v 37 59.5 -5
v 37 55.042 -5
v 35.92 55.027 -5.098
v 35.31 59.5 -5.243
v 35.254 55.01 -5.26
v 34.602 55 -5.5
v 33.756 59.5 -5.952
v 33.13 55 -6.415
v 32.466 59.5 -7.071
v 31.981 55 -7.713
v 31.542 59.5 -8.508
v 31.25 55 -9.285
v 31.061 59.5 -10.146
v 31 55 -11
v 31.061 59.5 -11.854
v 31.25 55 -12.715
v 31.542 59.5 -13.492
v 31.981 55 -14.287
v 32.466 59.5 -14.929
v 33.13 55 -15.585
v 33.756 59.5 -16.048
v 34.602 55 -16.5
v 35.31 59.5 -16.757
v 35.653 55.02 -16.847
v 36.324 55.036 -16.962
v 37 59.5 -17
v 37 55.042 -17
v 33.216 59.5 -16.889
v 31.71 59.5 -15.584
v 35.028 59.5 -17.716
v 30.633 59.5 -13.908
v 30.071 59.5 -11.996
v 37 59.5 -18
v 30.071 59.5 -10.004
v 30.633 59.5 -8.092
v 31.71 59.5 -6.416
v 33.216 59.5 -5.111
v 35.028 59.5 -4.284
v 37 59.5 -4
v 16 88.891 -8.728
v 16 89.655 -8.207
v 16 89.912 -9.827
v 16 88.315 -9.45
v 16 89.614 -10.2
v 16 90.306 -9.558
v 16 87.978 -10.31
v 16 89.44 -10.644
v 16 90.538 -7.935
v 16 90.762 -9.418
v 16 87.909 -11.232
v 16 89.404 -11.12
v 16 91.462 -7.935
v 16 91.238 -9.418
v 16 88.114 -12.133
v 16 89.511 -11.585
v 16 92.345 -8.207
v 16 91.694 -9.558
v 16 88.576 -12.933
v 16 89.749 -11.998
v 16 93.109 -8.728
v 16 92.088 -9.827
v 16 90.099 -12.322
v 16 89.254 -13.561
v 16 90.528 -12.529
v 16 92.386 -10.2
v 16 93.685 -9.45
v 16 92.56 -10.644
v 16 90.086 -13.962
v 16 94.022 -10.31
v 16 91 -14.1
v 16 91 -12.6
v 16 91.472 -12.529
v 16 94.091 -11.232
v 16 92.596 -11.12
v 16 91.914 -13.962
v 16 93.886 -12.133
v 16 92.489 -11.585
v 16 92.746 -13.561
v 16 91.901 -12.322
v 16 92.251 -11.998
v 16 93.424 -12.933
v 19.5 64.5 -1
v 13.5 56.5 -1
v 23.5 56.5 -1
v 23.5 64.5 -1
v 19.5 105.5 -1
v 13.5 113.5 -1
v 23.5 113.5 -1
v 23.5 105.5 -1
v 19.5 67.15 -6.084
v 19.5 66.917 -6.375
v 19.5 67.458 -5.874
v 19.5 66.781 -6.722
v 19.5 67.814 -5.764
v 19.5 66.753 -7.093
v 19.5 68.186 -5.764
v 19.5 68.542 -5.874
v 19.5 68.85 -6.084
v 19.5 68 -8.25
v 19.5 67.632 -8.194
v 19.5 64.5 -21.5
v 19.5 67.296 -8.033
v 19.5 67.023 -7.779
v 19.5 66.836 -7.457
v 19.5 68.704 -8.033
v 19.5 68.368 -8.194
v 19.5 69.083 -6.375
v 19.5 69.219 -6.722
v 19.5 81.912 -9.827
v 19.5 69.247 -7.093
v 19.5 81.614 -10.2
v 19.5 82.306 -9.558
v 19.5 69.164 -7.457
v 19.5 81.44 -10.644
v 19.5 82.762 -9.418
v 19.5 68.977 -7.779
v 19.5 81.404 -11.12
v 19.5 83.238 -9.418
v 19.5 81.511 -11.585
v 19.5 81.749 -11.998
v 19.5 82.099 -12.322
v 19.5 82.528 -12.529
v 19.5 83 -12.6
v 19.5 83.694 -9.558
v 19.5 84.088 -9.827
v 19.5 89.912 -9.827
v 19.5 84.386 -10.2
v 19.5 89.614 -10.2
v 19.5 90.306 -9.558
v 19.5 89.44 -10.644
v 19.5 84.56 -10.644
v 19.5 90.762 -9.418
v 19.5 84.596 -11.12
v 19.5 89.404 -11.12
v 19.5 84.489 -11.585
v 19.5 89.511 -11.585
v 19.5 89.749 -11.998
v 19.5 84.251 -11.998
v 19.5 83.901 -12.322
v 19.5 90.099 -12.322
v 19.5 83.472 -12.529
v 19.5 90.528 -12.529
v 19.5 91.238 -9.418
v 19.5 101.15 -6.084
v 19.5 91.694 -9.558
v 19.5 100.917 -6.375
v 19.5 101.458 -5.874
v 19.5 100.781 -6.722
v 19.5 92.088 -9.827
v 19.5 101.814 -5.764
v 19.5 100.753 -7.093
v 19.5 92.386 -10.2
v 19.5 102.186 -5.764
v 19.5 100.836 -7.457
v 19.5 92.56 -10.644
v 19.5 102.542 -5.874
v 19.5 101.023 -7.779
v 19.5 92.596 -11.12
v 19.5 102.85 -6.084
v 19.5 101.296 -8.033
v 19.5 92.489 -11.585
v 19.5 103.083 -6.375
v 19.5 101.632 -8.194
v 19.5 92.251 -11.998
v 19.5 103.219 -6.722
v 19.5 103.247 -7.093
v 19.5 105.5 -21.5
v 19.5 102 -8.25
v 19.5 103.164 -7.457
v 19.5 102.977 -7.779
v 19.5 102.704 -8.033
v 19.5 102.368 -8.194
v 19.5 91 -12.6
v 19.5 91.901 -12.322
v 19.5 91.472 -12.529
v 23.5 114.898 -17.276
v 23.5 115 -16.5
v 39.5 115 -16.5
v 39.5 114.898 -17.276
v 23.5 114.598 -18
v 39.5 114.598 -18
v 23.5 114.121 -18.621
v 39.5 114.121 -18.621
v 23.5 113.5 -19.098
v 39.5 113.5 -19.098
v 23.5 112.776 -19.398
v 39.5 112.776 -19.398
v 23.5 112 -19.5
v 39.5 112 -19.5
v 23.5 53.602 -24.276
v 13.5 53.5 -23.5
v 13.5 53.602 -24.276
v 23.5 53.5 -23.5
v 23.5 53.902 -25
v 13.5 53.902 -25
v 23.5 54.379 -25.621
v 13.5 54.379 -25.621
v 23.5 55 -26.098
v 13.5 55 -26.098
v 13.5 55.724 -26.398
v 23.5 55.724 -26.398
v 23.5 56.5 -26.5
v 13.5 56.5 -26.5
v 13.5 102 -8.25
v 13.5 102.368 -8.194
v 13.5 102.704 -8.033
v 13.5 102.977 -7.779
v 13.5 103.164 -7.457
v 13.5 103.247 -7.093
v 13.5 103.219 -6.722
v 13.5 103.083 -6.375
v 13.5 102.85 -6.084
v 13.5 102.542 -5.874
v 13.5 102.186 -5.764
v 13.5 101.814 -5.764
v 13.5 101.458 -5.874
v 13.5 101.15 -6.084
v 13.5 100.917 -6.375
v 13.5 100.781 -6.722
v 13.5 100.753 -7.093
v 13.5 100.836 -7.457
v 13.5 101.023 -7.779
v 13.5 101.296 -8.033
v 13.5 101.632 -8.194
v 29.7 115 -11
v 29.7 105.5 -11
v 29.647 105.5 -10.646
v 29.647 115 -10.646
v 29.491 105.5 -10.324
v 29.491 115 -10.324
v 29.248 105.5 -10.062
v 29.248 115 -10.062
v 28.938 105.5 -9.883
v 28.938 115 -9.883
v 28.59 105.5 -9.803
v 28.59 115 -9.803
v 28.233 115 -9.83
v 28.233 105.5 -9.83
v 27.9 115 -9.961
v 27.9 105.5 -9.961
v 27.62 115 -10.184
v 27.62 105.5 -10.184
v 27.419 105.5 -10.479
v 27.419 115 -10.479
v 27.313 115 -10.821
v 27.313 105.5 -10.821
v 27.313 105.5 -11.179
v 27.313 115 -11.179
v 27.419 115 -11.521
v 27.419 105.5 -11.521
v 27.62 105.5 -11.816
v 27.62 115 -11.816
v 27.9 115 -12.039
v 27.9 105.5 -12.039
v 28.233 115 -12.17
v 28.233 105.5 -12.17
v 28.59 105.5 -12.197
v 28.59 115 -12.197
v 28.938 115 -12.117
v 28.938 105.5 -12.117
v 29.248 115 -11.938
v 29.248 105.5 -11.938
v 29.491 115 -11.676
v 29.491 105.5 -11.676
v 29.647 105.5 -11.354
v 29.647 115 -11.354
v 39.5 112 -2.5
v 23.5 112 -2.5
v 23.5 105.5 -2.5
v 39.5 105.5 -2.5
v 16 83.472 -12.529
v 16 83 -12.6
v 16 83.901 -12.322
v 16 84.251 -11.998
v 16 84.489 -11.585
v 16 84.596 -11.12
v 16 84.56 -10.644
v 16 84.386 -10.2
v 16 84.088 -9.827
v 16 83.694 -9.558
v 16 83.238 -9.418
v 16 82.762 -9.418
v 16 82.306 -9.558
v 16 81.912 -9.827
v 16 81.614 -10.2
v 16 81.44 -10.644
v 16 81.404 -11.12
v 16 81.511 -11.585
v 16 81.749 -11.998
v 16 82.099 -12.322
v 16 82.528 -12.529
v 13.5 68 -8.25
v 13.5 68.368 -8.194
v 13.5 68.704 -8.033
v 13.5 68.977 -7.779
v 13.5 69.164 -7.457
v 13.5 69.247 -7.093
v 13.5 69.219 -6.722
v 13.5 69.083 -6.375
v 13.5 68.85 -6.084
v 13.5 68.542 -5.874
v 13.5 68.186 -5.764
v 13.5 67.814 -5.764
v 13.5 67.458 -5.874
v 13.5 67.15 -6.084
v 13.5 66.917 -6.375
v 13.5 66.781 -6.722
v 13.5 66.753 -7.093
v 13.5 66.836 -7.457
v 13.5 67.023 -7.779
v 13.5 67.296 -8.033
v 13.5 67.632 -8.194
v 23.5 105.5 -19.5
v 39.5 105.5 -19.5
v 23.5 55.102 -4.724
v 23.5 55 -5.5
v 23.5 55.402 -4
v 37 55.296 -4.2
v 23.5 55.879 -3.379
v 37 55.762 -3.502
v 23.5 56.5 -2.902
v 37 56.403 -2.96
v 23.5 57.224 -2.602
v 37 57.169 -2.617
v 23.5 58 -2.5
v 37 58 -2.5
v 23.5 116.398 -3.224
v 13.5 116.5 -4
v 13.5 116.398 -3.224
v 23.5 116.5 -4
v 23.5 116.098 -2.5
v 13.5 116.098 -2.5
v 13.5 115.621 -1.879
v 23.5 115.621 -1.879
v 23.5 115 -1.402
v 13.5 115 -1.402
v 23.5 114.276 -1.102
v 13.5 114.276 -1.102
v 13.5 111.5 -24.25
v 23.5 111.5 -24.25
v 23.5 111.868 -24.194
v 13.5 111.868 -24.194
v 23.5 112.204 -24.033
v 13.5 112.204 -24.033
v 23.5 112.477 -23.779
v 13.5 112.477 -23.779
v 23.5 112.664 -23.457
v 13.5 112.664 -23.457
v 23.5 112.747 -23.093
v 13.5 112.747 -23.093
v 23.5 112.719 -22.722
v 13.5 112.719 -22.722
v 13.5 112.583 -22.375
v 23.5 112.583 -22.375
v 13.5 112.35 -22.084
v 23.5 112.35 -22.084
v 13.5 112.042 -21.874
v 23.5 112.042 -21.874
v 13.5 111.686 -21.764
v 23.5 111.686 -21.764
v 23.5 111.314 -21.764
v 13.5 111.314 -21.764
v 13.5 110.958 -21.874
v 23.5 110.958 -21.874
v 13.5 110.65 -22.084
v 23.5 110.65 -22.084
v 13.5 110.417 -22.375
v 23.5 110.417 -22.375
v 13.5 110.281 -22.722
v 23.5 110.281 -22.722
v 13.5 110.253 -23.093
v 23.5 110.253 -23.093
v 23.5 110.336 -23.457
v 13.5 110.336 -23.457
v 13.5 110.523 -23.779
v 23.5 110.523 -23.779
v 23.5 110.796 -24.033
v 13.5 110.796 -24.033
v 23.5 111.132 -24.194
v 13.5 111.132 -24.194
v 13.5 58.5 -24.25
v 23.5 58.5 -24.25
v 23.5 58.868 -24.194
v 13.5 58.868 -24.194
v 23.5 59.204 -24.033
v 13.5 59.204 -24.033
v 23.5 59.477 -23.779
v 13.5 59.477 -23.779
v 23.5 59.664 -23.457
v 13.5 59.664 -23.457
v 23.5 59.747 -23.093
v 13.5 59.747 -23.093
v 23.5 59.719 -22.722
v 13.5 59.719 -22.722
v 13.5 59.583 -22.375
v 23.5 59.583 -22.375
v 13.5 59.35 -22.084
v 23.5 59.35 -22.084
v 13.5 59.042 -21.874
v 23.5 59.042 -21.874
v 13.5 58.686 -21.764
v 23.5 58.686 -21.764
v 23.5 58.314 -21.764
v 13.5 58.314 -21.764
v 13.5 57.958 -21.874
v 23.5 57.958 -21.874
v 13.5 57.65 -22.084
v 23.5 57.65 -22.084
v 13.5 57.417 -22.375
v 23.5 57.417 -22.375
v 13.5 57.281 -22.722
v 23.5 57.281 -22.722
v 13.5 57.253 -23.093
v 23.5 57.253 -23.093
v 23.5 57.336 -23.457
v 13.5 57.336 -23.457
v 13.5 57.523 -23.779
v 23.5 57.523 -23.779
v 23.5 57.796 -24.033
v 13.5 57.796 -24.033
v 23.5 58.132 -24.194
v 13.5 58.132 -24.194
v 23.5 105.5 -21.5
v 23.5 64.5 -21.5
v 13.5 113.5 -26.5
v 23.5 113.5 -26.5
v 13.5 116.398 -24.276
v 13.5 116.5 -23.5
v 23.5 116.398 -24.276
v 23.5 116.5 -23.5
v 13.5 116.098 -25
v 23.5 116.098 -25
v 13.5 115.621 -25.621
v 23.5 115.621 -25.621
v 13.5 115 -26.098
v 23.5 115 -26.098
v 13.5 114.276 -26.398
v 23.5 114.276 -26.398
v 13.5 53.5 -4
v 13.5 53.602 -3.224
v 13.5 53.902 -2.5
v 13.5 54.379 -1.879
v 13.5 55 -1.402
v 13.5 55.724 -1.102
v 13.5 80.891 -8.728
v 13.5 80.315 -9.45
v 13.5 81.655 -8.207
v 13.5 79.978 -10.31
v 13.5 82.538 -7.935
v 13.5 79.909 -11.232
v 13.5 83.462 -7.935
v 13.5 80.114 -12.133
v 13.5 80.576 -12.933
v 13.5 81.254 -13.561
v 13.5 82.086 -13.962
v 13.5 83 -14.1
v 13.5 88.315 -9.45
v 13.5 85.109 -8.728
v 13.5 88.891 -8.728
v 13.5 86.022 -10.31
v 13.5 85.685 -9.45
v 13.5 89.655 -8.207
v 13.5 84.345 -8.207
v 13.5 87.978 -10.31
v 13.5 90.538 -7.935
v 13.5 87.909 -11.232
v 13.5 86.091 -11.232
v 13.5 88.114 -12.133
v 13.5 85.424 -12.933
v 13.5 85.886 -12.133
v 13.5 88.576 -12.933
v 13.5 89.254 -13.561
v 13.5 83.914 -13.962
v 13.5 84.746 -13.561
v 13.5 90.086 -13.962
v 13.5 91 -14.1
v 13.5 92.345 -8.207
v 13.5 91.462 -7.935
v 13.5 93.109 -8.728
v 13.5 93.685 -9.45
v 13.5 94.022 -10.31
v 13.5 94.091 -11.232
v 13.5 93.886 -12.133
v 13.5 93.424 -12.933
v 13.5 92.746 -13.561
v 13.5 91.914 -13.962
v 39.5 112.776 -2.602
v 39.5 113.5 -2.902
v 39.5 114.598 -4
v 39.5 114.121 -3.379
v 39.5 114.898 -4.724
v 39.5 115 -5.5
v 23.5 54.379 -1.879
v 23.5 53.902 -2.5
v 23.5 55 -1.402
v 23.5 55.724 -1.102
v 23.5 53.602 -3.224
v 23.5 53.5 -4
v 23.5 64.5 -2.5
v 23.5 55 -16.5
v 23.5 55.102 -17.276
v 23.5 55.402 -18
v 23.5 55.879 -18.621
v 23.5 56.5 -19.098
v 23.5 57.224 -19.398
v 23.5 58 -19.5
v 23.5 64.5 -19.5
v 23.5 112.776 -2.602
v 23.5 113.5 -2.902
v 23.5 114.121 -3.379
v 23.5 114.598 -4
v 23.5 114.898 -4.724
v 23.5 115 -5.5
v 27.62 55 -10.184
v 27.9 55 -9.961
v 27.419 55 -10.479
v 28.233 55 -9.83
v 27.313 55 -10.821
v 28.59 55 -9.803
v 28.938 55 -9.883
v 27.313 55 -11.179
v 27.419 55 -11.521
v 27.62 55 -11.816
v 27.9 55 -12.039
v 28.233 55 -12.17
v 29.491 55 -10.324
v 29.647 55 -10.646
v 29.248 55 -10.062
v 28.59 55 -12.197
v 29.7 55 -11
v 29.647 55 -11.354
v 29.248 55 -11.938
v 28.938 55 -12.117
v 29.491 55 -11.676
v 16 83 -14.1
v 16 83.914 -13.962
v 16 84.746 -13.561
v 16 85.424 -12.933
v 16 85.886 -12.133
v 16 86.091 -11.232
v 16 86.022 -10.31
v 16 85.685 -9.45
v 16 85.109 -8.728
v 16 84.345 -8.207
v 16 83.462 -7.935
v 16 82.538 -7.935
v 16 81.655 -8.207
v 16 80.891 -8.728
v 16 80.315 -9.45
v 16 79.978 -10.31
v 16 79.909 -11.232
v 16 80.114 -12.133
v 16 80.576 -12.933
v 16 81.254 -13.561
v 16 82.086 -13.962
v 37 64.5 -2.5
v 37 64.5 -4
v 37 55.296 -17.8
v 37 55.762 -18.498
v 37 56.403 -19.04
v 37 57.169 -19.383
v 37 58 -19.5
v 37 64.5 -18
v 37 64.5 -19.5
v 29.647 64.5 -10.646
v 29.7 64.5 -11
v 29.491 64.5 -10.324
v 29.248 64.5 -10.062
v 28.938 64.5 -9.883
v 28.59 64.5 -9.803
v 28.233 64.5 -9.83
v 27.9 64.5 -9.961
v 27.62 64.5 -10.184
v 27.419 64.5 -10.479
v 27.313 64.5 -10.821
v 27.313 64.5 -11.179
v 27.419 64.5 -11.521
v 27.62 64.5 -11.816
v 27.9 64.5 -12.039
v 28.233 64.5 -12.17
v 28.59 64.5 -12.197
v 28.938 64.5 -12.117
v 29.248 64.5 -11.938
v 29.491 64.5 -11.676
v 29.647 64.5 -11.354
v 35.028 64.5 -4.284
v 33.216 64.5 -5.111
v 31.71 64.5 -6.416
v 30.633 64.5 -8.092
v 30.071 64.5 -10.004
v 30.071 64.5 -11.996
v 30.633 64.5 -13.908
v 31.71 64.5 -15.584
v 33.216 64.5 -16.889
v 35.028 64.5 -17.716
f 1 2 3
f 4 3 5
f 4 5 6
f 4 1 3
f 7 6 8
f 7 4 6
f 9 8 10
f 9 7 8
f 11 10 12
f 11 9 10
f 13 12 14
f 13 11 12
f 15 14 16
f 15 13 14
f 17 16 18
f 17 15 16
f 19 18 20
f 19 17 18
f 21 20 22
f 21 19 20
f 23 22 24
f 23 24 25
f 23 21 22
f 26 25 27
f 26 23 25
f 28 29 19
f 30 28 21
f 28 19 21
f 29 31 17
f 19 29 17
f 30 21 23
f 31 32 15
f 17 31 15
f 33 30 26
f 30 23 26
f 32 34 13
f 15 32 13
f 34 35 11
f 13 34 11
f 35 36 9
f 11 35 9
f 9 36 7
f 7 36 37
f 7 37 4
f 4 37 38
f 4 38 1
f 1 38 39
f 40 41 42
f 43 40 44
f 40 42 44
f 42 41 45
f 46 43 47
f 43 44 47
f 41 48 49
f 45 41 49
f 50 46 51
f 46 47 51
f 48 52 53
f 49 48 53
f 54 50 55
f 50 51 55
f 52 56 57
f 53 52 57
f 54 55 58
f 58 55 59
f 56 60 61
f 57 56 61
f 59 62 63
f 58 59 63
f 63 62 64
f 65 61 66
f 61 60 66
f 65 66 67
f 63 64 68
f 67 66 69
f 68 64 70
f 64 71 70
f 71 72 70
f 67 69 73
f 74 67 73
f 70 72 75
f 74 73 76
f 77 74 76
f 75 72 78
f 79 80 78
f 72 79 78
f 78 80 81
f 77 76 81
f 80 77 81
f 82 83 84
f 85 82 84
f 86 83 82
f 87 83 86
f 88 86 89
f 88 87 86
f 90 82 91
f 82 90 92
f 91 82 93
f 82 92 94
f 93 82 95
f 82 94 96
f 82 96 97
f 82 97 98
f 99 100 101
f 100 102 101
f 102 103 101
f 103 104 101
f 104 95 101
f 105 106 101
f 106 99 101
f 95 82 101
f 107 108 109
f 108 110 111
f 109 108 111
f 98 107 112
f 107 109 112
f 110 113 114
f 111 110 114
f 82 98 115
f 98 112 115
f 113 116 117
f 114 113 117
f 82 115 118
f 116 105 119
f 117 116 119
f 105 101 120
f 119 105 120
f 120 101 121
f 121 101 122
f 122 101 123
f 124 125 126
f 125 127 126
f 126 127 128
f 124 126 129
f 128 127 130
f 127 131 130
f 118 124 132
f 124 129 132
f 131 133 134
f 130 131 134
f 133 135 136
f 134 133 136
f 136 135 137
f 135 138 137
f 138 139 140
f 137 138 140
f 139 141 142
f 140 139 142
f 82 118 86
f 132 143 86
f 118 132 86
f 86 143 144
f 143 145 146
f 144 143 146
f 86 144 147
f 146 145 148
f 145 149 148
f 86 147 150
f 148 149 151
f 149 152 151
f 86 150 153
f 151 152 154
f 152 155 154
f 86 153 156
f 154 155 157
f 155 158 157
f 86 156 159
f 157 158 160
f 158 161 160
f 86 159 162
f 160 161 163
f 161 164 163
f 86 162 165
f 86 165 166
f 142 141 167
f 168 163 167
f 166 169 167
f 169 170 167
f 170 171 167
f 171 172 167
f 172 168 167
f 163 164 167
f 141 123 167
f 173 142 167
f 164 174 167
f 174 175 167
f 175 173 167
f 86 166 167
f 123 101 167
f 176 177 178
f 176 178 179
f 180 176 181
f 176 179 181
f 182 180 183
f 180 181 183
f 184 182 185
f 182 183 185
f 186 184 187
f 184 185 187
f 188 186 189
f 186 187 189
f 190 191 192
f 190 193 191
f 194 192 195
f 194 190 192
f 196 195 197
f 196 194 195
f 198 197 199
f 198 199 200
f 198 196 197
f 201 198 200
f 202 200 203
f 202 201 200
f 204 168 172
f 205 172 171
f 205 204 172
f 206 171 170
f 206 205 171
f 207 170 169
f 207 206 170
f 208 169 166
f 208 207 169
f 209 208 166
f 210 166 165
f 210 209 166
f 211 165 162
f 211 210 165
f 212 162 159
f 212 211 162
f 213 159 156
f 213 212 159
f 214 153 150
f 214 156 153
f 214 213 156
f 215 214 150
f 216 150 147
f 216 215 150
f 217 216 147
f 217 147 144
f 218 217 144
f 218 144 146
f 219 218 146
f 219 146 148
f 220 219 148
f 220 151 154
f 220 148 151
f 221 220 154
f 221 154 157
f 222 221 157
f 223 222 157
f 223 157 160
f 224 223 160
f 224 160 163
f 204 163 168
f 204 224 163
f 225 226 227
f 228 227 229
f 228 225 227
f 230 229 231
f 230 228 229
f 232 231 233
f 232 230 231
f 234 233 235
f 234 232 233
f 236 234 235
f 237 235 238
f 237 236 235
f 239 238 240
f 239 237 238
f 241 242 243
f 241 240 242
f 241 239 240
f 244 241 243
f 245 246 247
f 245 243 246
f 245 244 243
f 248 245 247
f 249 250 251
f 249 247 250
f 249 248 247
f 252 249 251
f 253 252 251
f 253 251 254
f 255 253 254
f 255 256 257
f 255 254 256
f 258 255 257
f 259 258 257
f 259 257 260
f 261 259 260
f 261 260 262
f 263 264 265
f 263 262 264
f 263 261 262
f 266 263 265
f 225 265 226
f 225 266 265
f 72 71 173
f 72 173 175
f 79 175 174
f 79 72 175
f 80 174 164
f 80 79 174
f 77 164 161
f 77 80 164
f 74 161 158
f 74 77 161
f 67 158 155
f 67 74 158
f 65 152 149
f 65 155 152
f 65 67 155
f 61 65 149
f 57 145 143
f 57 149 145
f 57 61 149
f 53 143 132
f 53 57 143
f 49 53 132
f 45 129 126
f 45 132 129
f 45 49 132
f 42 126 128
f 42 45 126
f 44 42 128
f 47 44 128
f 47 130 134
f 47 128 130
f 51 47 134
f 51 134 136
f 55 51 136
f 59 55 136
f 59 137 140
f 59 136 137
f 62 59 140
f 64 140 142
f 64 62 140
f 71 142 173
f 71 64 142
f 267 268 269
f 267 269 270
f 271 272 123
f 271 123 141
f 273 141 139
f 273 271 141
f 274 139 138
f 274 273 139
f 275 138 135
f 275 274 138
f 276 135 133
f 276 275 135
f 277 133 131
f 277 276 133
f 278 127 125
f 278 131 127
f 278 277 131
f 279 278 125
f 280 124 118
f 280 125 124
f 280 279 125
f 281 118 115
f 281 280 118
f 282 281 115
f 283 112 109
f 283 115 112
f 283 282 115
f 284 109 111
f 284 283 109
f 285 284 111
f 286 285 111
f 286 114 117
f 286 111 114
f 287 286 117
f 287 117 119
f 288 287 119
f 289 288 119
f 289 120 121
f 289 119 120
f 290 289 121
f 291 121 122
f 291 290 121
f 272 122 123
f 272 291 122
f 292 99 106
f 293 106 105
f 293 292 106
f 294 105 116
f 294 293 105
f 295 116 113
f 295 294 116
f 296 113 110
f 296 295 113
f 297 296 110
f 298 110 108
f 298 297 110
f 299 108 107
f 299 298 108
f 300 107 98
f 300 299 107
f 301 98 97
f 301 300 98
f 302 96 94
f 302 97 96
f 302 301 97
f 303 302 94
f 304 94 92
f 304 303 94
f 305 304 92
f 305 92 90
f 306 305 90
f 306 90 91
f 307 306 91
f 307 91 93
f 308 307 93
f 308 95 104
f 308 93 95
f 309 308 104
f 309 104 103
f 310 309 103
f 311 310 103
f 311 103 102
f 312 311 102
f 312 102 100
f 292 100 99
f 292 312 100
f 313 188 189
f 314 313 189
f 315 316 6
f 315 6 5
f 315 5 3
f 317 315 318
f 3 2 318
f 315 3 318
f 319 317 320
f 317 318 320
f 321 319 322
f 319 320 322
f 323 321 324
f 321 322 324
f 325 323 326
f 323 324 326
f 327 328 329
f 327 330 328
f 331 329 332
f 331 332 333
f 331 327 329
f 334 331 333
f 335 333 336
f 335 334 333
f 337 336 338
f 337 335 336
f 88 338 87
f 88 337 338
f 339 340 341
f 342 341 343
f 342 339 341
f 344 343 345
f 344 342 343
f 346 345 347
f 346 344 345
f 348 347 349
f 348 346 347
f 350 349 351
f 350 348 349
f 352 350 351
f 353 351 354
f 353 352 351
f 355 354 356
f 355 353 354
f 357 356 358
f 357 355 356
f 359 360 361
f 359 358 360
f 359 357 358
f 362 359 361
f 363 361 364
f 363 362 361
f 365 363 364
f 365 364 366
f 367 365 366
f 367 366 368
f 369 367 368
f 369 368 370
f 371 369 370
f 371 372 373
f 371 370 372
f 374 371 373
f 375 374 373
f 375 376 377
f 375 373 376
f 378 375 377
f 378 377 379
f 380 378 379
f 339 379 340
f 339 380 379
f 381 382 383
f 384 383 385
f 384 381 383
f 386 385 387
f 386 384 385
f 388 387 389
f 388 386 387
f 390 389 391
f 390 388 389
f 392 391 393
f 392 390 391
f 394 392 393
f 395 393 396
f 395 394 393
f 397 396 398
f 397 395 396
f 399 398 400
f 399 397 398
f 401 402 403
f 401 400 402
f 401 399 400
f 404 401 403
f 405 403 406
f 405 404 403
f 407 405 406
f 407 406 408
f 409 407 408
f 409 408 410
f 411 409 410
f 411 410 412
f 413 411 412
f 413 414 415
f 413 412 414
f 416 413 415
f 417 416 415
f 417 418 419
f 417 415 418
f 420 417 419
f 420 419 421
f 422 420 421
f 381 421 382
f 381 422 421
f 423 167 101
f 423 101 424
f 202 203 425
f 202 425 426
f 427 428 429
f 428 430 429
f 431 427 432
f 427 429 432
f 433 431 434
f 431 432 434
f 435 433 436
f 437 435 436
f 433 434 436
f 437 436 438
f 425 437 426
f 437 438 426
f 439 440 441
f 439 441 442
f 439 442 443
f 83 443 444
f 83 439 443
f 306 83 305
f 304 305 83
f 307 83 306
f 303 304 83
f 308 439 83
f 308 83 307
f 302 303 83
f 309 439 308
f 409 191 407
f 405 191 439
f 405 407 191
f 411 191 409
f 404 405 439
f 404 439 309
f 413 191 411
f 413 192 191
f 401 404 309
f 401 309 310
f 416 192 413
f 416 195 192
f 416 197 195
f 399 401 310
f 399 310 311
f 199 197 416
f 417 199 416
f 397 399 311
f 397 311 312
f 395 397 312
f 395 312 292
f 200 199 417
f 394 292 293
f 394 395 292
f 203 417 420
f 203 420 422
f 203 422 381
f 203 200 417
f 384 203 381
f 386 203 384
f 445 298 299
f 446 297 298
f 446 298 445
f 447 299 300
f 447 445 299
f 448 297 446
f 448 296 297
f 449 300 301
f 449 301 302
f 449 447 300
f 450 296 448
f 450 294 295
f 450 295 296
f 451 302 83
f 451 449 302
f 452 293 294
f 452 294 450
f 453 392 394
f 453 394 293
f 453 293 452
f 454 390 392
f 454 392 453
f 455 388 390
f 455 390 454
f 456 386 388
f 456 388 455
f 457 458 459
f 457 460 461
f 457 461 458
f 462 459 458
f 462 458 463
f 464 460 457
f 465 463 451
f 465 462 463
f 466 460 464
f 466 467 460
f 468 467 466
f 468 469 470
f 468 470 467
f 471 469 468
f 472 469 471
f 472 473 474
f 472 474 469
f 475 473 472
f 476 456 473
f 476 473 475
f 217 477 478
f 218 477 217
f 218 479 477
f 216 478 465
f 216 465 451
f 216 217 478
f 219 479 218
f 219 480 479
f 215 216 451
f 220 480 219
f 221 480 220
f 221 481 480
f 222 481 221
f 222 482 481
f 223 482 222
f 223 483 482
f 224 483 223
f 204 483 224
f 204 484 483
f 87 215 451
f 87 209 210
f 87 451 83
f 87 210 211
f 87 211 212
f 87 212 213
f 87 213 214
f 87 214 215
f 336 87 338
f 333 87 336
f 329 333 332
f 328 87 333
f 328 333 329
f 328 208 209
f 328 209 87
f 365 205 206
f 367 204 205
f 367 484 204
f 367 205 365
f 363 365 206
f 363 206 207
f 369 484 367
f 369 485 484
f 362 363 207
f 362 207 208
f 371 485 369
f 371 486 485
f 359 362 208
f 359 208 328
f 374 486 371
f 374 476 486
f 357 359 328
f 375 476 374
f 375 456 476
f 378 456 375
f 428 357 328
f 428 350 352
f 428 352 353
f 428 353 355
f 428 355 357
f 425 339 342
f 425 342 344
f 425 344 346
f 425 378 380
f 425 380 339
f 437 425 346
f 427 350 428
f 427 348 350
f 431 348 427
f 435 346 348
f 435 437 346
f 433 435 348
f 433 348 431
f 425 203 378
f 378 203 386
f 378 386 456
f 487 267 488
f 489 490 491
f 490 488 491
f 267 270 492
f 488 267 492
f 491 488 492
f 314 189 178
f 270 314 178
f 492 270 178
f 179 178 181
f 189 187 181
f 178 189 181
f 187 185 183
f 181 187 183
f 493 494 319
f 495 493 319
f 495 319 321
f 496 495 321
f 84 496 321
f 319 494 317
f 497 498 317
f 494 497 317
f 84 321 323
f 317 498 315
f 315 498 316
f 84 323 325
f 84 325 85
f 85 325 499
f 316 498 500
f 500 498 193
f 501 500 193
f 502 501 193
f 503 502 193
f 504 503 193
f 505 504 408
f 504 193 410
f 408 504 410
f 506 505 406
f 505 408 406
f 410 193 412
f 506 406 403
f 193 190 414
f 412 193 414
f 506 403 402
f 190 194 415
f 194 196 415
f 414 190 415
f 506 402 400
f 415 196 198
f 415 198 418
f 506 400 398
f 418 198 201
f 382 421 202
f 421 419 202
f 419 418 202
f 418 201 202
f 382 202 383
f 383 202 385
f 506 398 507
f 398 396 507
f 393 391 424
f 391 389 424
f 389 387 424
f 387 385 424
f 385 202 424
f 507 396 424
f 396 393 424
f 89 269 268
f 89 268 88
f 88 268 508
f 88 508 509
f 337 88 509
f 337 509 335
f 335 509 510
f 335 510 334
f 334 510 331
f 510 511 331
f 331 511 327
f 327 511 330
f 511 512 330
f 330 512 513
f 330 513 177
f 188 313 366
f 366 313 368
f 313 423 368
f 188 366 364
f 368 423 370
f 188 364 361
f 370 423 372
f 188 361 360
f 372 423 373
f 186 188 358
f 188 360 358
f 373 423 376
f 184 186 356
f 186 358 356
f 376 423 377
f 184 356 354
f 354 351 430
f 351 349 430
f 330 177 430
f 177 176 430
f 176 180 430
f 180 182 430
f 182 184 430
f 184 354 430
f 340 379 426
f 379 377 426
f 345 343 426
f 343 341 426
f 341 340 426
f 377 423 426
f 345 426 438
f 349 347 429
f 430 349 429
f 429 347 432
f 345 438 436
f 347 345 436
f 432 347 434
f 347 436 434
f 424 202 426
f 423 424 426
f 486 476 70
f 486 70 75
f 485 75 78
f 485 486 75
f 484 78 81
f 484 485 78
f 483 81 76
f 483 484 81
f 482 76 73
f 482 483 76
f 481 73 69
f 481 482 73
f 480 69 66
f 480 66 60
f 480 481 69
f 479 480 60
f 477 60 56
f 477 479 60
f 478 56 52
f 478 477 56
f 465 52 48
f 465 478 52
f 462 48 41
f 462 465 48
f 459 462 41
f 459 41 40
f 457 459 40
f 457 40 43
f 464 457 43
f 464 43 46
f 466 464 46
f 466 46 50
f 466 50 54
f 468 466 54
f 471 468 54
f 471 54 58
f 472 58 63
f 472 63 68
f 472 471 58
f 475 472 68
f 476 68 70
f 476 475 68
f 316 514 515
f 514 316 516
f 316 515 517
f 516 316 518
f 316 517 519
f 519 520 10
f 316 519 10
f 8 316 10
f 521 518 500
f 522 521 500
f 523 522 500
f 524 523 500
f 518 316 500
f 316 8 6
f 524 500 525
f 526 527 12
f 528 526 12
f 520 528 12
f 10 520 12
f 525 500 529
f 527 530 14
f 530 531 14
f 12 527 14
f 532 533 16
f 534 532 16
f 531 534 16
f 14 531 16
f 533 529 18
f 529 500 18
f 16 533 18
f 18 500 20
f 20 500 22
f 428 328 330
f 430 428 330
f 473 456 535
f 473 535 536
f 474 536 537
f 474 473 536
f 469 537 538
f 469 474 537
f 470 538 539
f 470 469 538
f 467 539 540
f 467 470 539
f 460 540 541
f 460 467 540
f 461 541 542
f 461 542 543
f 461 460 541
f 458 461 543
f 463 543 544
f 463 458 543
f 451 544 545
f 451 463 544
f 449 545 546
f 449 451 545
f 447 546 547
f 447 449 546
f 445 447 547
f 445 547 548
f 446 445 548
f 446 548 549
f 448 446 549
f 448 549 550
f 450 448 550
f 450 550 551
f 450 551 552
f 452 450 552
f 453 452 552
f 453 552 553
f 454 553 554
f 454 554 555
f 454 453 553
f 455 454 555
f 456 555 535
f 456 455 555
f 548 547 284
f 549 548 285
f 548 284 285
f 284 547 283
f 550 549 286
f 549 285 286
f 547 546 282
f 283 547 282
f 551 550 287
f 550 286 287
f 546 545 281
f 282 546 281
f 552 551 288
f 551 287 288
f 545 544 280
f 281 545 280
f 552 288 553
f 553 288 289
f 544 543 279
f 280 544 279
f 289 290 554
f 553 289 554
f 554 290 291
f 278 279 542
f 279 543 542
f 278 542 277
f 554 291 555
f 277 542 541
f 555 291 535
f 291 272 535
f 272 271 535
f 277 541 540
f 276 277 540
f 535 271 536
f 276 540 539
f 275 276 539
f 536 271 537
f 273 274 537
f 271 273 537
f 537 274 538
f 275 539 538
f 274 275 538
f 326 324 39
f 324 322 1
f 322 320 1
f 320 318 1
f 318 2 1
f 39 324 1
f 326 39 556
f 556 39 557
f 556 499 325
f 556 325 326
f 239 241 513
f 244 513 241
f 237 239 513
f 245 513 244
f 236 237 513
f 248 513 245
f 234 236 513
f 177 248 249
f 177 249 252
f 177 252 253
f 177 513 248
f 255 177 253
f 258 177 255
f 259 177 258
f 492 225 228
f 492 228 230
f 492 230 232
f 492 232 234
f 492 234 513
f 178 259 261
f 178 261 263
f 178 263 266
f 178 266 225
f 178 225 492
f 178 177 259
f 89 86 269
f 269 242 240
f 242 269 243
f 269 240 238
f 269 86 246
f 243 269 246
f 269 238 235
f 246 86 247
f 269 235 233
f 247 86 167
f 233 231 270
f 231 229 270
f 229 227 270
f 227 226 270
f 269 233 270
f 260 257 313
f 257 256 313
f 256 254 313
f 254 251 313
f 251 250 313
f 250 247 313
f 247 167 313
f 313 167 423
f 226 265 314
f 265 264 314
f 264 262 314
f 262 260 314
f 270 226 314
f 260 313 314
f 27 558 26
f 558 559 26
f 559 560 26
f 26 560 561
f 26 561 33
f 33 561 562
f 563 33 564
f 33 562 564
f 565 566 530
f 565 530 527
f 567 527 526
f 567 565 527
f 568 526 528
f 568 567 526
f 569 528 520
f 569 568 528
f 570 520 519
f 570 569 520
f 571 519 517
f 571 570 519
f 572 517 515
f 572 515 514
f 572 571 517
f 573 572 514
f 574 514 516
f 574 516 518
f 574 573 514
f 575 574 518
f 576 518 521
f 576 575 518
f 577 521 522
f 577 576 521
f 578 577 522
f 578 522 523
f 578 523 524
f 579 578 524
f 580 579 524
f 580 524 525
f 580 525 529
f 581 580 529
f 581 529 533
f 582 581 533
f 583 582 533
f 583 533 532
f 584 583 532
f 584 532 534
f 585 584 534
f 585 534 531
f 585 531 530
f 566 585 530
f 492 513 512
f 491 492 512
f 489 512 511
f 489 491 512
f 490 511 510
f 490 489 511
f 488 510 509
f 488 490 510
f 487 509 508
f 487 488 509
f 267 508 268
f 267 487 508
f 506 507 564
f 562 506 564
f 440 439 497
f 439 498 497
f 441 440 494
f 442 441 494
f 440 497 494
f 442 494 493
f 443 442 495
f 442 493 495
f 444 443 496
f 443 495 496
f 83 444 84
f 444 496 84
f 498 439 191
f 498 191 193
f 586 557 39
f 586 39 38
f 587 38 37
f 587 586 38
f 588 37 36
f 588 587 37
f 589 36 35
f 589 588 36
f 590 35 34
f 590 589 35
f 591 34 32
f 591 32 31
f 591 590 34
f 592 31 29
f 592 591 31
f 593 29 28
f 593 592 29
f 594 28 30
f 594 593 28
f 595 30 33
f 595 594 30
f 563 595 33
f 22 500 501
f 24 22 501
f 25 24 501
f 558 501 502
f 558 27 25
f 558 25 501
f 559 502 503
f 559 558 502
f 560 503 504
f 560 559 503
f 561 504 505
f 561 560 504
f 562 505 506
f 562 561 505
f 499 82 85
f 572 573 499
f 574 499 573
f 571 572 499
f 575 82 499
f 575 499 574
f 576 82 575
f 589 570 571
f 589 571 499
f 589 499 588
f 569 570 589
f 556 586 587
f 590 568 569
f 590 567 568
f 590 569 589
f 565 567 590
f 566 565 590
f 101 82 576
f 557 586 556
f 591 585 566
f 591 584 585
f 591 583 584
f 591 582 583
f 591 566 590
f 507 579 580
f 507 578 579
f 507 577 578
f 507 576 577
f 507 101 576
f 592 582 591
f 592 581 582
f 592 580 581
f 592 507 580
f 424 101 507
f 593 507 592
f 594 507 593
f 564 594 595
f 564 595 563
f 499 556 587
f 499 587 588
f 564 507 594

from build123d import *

# Parameters (mm, degrees)
CYLINDER893_R           = 1.6
CYLINDER893_DEPTH       = 10
CYLINDER893_PITCH_ANGLE = 90
CYLINDER894_R           = 1.6
CYLINDER894_DEPTH       = 10
CYLINDER894_PITCH_ANGLE = 90
CYLINDER896_R           = 3.1
CYLINDER896_DEPTH       = 2.5
CYLINDER896_PITCH_ANGLE = 90
CYLINDER895_R           = 3.1
CYLINDER895_DEPTH       = 2.5
CYLINDER895_PITCH_ANGLE = 90
BOX550_W                = 41
BOX550_H                = 41
BOX550_DEPTH            = 21
CYLINDER891_R           = 6
CYLINDER891_DEPTH       = 11
CYLINDER891_ROLL_ANGLE  = 90
CYLINDER945_R           = 7
CYLINDER945_DEPTH       = 5
CYLINDER945_ROLL_ANGLE  = 90
BOX559_W                = 10
BOX559_H                = 10
BOX559_DEPTH            = 17
CYLINDER693_R           = 1.2
CYLINDER693_DEPTH       = 10
CYLINDER693_ROLL_ANGLE  = 90
CYLINDER692_R           = 1.2
CYLINDER692_DEPTH       = 10
CYLINDER692_ROLL_ANGLE  = 90
CYLINDER697_R           = 1.25
CYLINDER697_DEPTH       = 15
CYLINDER697_PITCH_ANGLE = 90
CYLINDER695_R           = 1.25
CYLINDER695_DEPTH       = 11
CYLINDER695_PITCH_ANGLE = 90
CYLINDER696_R           = 1.25
CYLINDER696_DEPTH       = 15
CYLINDER696_PITCH_ANGLE = 90
CYLINDER694_R           = 1.25
CYLINDER694_DEPTH       = 11
CYLINDER694_PITCH_ANGLE = 90
BOX472_W                = 16
BOX472_H                = 60
BOX472_DEPTH            = 17
FILLET333_R             = 3
BOX473_W                = 10
BOX473_H                = 63
BOX473_DEPTH            = 25.5
FILLET332_R             = 3


with BuildPart() as cylinder1049:
    # Cylinder893 → Cylinder893 (new body)
    with BuildSketch(Plane.XY):
        Circle(CYLINDER893_R)
    extrude(amount=CYLINDER893_DEPTH)


with BuildPart() as cylinder1049_1:
    # Cylinder893 pitch: moved
    add(cylinder1049.part.rotate(Axis((0, 0, 0), (0, 1, 0)), CYLINDER893_PITCH_ANGLE))


with BuildPart() as cylinder1049_2:
    # Cylinder893 placement: moved
    add(cylinder1049_1.part.moved(Location((13.5, 83, -11))))


with BuildPart() as cylinder1050:
    # Cylinder894 → Cylinder894 (new body)
    with BuildSketch(Plane.XY):
        Circle(CYLINDER894_R)
    extrude(amount=CYLINDER894_DEPTH)


with BuildPart() as cylinder1050_1:
    # Cylinder894 pitch: moved
    add(cylinder1050.part.rotate(Axis((0, 0, 0), (0, 1, 0)), CYLINDER894_PITCH_ANGLE))


with BuildPart() as cylinder1050_2:
    # Cylinder894 placement: moved
    add(cylinder1050_1.part.moved(Location((13.5, 91, -11))))


with BuildPart() as cylinder1052:
    # Cylinder896 → Cylinder896 (new body)
    with BuildSketch(Plane.XY):
        Circle(CYLINDER896_R)
    extrude(amount=CYLINDER896_DEPTH)


with BuildPart() as cylinder1052_1:
    # Cylinder896 pitch: moved
    add(cylinder1052.part.rotate(Axis((0, 0, 0), (0, 1, 0)), CYLINDER896_PITCH_ANGLE))


with BuildPart() as cylinder1052_2:
    # Cylinder896 placement: moved
    add(cylinder1052_1.part.moved(Location((13.5, 83, -11))))


with BuildPart() as fusion593:
    # Cylinder895 → Cylinder895 (new body)
    with BuildSketch(Plane.XY):
        Circle(CYLINDER895_R)
    extrude(amount=CYLINDER895_DEPTH)


with BuildPart() as fusion593_1:
    # Cylinder895 pitch: moved
    add(fusion593.part.rotate(Axis((0, 0, 0), (0, 1, 0)), CYLINDER895_PITCH_ANGLE))


with BuildPart() as fusion593_2:
    # Cylinder895 placement: moved
    add(fusion593_1.part.moved(Location((13.5, 91, -11))))

    # Fusion593: union Cylinder1049, Cylinder1050, Cylinder1052
    add(cylinder1049_2.part)
    add(cylinder1050_2.part)
    add(cylinder1052_2.part)


with BuildPart() as cube741:
    # Box550 → Box550 (new body)
    with BuildSketch(Plane(origin=(19.5, 64.5, -21.5), x_dir=(1, 0, 0), z_dir=(0, 0, 1))):
        with Locations((20.5, 20.5)):
            Rectangle(BOX550_W, BOX550_H)
    extrude(amount=BOX550_DEPTH)


with BuildPart() as cylinder1048:
    # Cylinder891 → Cylinder891 (new body)
    with BuildSketch(Plane.XY):
        Circle(CYLINDER891_R)
    extrude(amount=CYLINDER891_DEPTH)


with BuildPart() as cylinder1048_1:
    # Cylinder891 roll: moved
    add(cylinder1048.part.rotate(Axis((0, 0, 0), (1, 0, 0)), CYLINDER891_ROLL_ANGLE))


with BuildPart() as cylinder1048_2:
    # Cylinder891 placement: moved
    add(cylinder1048_1.part.moved(Location((37, 64.5, -11))))


with BuildPart() as cylinder1090:
    # Cylinder945 → Cylinder945 (new body)
    with BuildSketch(Plane.XY):
        Circle(CYLINDER945_R)
    extrude(amount=CYLINDER945_DEPTH)


with BuildPart() as cylinder1090_1:
    # Cylinder945 roll: moved
    add(cylinder1090.part.rotate(Axis((0, 0, 0), (1, 0, 0)), CYLINDER945_ROLL_ANGLE))


with BuildPart() as cylinder1090_2:
    # Cylinder945 placement: moved
    add(cylinder1090_1.part.moved(Location((37, 64.5, -11))))


with BuildPart() as fusion598:
    # Box559 → Box559 (new body)
    with BuildSketch(Plane(origin=(37, 55, -19.5), x_dir=(1, 0, 0), z_dir=(0, 0, 1))):
        with Locations((5, 5)):
            Rectangle(BOX559_W, BOX559_H)
    extrude(amount=BOX559_DEPTH)

    # Fusion598: union Cube741, Cylinder1048, Cylinder1090
    add(cube741.part)
    add(cylinder1048_2.part)
    add(cylinder1090_2.part)


with BuildPart() as cylinder943:
    # Cylinder693 → Cylinder693 (new body)
    with BuildSketch(Plane.XY):
        Circle(CYLINDER693_R)
    extrude(amount=CYLINDER693_DEPTH)


with BuildPart() as cylinder943_1:
    # Cylinder693 roll: moved
    add(cylinder943.part.rotate(Axis((0, 0, 0), (1, 0, 0)), CYLINDER693_ROLL_ANGLE))


with BuildPart() as cylinder943_2:
    # Cylinder693 placement: moved
    add(cylinder943_1.part.moved(Location((3, 10, 10))))


with BuildPart() as fusion462:
    # Cylinder692 → Cylinder692 (new body)
    with BuildSketch(Plane.XY):
        Circle(CYLINDER692_R)
    extrude(amount=CYLINDER692_DEPTH)


with BuildPart() as fusion462_1:
    # Cylinder692 roll: moved
    add(fusion462.part.rotate(Axis((0, 0, 0), (1, 0, 0)), CYLINDER692_ROLL_ANGLE))


with BuildPart() as fusion462_2:
    # Cylinder692 placement: moved
    add(fusion462_1.part.moved(Location((3, 60, 10))))

    # Fusion462: union Cylinder943
    add(cylinder943_2.part)


with BuildPart() as fusion462_3:
    # Fusion462 placement: moved
    add(fusion462_2.part.moved(Location((0, 0, 2))))


with BuildPart() as cylinder976:
    # Cylinder697 → Cylinder697 (new body)
    with BuildSketch(Plane.XY):
        Circle(CYLINDER697_R)
    extrude(amount=CYLINDER697_DEPTH)


with BuildPart() as cylinder976_1:
    # Cylinder697 pitch: moved
    add(cylinder976.part.rotate(Axis((0, 0, 0), (0, 1, 0)), CYLINDER697_PITCH_ANGLE))


with BuildPart() as cylinder976_2:
    # Cylinder697 placement: moved
    add(cylinder976_1.part.moved(Location((-2, 23, 15))))


with BuildPart() as cylinder974:
    # Cylinder695 → Cylinder695 (new body)
    with BuildSketch(Plane.XY):
        Circle(CYLINDER695_R)
    extrude(amount=CYLINDER695_DEPTH)


with BuildPart() as cylinder974_1:
    # Cylinder695 pitch: moved
    add(cylinder974.part.rotate(Axis((0, 0, 0), (0, 1, 0)), CYLINDER695_PITCH_ANGLE))


with BuildPart() as cylinder974_2:
    # Cylinder695 placement: moved
    add(cylinder974_1.part.moved(Location((-2, 13.5, -1))))


with BuildPart() as cylinder975:
    # Cylinder696 → Cylinder696 (new body)
    with BuildSketch(Plane.XY):
        Circle(CYLINDER696_R)
    extrude(amount=CYLINDER696_DEPTH)


with BuildPart() as cylinder975_1:
    # Cylinder696 pitch: moved
    add(cylinder975.part.rotate(Axis((0, 0, 0), (0, 1, 0)), CYLINDER696_PITCH_ANGLE))


with BuildPart() as cylinder975_2:
    # Cylinder696 placement: moved
    add(cylinder975_1.part.moved(Location((-2, 57, 15))))


with BuildPart() as fusion463:
    # Cylinder694 → Cylinder694 (new body)
    with BuildSketch(Plane.XY):
        Circle(CYLINDER694_R)
    extrude(amount=CYLINDER694_DEPTH)


with BuildPart() as fusion463_1:
    # Cylinder694 pitch: moved
    add(fusion463.part.rotate(Axis((0, 0, 0), (0, 1, 0)), CYLINDER694_PITCH_ANGLE))


with BuildPart() as fusion463_2:
    # Cylinder694 placement: moved
    add(fusion463_1.part.moved(Location((-2, 66.5, -1))))

    # Fusion460: union Cylinder976, Cylinder974, Cylinder975
    add(cylinder976_2.part)
    add(cylinder974_2.part)
    add(cylinder975_2.part)


with BuildPart() as fusion463_3:
    # Fusion460 placement: moved
    add(fusion463_2.part.moved(Location((-10, -10, 1))))

    # Fusion463: union Fusion462
    add(fusion462_3.part)


with BuildPart() as fusion463_4:
    # Fusion463 placement: moved
    add(fusion463_3.part.moved(Location((25.5, 55, -23))))


with BuildPart() as fillet333:
    # Box472 → Box472 (new body)
    with BuildSketch(Plane(origin=(-2, 0, 1.5), x_dir=(1, 0, 0), z_dir=(0, 0, 1))):
        with Locations((8, 30)):
            Rectangle(BOX472_W, BOX472_H)
    extrude(amount=BOX472_DEPTH)

    # Fillet333
    fillet333_edges = [fillet333.edges().sort_by_distance(p)[0] for p in [
        (6, 0, 1.5),
        (6, 0, 18.5),
        (6, 60, 1.5),
        (6, 60, 18.5),
    ]]
    fillet(fillet333_edges, radius=FILLET333_R)


with BuildPart() as fillet333_1:
    # Fillet333 placement: moved
    add(fillet333.part.moved(Location((25.5, 55, -21))))


with BuildPart() as cross_member_front:
    # Box473 → Box473 (new body)
    with BuildSketch(Plane(origin=(-12, 0, -5), x_dir=(1, 0, 0), z_dir=(0, 0, 1))):
        with Locations((5, 31.5)):
            Rectangle(BOX473_W, BOX473_H)
    extrude(amount=BOX473_DEPTH)

    # Fillet332
    fillet332_edges = [cross_member_front.edges().sort_by_distance(p)[0] for p in [
        (-7, 0, -5),
        (-7, 0, 20.5),
        (-7, 63, -5),
        (-7, 63, 20.5),
    ]]
    fillet(fillet332_edges, radius=FILLET332_R)


with BuildPart() as cross_member_front_1:
    # Fillet332 placement: moved
    add(cross_member_front.part.moved(Location((25.5, 53.5, -21.5))))

    # Fusion464: union Fillet333
    add(fillet333_1.part)

    # Cut581: cut Fusion463
    add(fusion463_4.part, mode=Mode.SUBTRACT)

    # Cut696: cut Fusion598
    add(fusion598.part, mode=Mode.SUBTRACT)

    # Cut697: cut Fusion593
    add(fusion593_2.part, mode=Mode.SUBTRACT)


solid = cross_member_front_1.part
